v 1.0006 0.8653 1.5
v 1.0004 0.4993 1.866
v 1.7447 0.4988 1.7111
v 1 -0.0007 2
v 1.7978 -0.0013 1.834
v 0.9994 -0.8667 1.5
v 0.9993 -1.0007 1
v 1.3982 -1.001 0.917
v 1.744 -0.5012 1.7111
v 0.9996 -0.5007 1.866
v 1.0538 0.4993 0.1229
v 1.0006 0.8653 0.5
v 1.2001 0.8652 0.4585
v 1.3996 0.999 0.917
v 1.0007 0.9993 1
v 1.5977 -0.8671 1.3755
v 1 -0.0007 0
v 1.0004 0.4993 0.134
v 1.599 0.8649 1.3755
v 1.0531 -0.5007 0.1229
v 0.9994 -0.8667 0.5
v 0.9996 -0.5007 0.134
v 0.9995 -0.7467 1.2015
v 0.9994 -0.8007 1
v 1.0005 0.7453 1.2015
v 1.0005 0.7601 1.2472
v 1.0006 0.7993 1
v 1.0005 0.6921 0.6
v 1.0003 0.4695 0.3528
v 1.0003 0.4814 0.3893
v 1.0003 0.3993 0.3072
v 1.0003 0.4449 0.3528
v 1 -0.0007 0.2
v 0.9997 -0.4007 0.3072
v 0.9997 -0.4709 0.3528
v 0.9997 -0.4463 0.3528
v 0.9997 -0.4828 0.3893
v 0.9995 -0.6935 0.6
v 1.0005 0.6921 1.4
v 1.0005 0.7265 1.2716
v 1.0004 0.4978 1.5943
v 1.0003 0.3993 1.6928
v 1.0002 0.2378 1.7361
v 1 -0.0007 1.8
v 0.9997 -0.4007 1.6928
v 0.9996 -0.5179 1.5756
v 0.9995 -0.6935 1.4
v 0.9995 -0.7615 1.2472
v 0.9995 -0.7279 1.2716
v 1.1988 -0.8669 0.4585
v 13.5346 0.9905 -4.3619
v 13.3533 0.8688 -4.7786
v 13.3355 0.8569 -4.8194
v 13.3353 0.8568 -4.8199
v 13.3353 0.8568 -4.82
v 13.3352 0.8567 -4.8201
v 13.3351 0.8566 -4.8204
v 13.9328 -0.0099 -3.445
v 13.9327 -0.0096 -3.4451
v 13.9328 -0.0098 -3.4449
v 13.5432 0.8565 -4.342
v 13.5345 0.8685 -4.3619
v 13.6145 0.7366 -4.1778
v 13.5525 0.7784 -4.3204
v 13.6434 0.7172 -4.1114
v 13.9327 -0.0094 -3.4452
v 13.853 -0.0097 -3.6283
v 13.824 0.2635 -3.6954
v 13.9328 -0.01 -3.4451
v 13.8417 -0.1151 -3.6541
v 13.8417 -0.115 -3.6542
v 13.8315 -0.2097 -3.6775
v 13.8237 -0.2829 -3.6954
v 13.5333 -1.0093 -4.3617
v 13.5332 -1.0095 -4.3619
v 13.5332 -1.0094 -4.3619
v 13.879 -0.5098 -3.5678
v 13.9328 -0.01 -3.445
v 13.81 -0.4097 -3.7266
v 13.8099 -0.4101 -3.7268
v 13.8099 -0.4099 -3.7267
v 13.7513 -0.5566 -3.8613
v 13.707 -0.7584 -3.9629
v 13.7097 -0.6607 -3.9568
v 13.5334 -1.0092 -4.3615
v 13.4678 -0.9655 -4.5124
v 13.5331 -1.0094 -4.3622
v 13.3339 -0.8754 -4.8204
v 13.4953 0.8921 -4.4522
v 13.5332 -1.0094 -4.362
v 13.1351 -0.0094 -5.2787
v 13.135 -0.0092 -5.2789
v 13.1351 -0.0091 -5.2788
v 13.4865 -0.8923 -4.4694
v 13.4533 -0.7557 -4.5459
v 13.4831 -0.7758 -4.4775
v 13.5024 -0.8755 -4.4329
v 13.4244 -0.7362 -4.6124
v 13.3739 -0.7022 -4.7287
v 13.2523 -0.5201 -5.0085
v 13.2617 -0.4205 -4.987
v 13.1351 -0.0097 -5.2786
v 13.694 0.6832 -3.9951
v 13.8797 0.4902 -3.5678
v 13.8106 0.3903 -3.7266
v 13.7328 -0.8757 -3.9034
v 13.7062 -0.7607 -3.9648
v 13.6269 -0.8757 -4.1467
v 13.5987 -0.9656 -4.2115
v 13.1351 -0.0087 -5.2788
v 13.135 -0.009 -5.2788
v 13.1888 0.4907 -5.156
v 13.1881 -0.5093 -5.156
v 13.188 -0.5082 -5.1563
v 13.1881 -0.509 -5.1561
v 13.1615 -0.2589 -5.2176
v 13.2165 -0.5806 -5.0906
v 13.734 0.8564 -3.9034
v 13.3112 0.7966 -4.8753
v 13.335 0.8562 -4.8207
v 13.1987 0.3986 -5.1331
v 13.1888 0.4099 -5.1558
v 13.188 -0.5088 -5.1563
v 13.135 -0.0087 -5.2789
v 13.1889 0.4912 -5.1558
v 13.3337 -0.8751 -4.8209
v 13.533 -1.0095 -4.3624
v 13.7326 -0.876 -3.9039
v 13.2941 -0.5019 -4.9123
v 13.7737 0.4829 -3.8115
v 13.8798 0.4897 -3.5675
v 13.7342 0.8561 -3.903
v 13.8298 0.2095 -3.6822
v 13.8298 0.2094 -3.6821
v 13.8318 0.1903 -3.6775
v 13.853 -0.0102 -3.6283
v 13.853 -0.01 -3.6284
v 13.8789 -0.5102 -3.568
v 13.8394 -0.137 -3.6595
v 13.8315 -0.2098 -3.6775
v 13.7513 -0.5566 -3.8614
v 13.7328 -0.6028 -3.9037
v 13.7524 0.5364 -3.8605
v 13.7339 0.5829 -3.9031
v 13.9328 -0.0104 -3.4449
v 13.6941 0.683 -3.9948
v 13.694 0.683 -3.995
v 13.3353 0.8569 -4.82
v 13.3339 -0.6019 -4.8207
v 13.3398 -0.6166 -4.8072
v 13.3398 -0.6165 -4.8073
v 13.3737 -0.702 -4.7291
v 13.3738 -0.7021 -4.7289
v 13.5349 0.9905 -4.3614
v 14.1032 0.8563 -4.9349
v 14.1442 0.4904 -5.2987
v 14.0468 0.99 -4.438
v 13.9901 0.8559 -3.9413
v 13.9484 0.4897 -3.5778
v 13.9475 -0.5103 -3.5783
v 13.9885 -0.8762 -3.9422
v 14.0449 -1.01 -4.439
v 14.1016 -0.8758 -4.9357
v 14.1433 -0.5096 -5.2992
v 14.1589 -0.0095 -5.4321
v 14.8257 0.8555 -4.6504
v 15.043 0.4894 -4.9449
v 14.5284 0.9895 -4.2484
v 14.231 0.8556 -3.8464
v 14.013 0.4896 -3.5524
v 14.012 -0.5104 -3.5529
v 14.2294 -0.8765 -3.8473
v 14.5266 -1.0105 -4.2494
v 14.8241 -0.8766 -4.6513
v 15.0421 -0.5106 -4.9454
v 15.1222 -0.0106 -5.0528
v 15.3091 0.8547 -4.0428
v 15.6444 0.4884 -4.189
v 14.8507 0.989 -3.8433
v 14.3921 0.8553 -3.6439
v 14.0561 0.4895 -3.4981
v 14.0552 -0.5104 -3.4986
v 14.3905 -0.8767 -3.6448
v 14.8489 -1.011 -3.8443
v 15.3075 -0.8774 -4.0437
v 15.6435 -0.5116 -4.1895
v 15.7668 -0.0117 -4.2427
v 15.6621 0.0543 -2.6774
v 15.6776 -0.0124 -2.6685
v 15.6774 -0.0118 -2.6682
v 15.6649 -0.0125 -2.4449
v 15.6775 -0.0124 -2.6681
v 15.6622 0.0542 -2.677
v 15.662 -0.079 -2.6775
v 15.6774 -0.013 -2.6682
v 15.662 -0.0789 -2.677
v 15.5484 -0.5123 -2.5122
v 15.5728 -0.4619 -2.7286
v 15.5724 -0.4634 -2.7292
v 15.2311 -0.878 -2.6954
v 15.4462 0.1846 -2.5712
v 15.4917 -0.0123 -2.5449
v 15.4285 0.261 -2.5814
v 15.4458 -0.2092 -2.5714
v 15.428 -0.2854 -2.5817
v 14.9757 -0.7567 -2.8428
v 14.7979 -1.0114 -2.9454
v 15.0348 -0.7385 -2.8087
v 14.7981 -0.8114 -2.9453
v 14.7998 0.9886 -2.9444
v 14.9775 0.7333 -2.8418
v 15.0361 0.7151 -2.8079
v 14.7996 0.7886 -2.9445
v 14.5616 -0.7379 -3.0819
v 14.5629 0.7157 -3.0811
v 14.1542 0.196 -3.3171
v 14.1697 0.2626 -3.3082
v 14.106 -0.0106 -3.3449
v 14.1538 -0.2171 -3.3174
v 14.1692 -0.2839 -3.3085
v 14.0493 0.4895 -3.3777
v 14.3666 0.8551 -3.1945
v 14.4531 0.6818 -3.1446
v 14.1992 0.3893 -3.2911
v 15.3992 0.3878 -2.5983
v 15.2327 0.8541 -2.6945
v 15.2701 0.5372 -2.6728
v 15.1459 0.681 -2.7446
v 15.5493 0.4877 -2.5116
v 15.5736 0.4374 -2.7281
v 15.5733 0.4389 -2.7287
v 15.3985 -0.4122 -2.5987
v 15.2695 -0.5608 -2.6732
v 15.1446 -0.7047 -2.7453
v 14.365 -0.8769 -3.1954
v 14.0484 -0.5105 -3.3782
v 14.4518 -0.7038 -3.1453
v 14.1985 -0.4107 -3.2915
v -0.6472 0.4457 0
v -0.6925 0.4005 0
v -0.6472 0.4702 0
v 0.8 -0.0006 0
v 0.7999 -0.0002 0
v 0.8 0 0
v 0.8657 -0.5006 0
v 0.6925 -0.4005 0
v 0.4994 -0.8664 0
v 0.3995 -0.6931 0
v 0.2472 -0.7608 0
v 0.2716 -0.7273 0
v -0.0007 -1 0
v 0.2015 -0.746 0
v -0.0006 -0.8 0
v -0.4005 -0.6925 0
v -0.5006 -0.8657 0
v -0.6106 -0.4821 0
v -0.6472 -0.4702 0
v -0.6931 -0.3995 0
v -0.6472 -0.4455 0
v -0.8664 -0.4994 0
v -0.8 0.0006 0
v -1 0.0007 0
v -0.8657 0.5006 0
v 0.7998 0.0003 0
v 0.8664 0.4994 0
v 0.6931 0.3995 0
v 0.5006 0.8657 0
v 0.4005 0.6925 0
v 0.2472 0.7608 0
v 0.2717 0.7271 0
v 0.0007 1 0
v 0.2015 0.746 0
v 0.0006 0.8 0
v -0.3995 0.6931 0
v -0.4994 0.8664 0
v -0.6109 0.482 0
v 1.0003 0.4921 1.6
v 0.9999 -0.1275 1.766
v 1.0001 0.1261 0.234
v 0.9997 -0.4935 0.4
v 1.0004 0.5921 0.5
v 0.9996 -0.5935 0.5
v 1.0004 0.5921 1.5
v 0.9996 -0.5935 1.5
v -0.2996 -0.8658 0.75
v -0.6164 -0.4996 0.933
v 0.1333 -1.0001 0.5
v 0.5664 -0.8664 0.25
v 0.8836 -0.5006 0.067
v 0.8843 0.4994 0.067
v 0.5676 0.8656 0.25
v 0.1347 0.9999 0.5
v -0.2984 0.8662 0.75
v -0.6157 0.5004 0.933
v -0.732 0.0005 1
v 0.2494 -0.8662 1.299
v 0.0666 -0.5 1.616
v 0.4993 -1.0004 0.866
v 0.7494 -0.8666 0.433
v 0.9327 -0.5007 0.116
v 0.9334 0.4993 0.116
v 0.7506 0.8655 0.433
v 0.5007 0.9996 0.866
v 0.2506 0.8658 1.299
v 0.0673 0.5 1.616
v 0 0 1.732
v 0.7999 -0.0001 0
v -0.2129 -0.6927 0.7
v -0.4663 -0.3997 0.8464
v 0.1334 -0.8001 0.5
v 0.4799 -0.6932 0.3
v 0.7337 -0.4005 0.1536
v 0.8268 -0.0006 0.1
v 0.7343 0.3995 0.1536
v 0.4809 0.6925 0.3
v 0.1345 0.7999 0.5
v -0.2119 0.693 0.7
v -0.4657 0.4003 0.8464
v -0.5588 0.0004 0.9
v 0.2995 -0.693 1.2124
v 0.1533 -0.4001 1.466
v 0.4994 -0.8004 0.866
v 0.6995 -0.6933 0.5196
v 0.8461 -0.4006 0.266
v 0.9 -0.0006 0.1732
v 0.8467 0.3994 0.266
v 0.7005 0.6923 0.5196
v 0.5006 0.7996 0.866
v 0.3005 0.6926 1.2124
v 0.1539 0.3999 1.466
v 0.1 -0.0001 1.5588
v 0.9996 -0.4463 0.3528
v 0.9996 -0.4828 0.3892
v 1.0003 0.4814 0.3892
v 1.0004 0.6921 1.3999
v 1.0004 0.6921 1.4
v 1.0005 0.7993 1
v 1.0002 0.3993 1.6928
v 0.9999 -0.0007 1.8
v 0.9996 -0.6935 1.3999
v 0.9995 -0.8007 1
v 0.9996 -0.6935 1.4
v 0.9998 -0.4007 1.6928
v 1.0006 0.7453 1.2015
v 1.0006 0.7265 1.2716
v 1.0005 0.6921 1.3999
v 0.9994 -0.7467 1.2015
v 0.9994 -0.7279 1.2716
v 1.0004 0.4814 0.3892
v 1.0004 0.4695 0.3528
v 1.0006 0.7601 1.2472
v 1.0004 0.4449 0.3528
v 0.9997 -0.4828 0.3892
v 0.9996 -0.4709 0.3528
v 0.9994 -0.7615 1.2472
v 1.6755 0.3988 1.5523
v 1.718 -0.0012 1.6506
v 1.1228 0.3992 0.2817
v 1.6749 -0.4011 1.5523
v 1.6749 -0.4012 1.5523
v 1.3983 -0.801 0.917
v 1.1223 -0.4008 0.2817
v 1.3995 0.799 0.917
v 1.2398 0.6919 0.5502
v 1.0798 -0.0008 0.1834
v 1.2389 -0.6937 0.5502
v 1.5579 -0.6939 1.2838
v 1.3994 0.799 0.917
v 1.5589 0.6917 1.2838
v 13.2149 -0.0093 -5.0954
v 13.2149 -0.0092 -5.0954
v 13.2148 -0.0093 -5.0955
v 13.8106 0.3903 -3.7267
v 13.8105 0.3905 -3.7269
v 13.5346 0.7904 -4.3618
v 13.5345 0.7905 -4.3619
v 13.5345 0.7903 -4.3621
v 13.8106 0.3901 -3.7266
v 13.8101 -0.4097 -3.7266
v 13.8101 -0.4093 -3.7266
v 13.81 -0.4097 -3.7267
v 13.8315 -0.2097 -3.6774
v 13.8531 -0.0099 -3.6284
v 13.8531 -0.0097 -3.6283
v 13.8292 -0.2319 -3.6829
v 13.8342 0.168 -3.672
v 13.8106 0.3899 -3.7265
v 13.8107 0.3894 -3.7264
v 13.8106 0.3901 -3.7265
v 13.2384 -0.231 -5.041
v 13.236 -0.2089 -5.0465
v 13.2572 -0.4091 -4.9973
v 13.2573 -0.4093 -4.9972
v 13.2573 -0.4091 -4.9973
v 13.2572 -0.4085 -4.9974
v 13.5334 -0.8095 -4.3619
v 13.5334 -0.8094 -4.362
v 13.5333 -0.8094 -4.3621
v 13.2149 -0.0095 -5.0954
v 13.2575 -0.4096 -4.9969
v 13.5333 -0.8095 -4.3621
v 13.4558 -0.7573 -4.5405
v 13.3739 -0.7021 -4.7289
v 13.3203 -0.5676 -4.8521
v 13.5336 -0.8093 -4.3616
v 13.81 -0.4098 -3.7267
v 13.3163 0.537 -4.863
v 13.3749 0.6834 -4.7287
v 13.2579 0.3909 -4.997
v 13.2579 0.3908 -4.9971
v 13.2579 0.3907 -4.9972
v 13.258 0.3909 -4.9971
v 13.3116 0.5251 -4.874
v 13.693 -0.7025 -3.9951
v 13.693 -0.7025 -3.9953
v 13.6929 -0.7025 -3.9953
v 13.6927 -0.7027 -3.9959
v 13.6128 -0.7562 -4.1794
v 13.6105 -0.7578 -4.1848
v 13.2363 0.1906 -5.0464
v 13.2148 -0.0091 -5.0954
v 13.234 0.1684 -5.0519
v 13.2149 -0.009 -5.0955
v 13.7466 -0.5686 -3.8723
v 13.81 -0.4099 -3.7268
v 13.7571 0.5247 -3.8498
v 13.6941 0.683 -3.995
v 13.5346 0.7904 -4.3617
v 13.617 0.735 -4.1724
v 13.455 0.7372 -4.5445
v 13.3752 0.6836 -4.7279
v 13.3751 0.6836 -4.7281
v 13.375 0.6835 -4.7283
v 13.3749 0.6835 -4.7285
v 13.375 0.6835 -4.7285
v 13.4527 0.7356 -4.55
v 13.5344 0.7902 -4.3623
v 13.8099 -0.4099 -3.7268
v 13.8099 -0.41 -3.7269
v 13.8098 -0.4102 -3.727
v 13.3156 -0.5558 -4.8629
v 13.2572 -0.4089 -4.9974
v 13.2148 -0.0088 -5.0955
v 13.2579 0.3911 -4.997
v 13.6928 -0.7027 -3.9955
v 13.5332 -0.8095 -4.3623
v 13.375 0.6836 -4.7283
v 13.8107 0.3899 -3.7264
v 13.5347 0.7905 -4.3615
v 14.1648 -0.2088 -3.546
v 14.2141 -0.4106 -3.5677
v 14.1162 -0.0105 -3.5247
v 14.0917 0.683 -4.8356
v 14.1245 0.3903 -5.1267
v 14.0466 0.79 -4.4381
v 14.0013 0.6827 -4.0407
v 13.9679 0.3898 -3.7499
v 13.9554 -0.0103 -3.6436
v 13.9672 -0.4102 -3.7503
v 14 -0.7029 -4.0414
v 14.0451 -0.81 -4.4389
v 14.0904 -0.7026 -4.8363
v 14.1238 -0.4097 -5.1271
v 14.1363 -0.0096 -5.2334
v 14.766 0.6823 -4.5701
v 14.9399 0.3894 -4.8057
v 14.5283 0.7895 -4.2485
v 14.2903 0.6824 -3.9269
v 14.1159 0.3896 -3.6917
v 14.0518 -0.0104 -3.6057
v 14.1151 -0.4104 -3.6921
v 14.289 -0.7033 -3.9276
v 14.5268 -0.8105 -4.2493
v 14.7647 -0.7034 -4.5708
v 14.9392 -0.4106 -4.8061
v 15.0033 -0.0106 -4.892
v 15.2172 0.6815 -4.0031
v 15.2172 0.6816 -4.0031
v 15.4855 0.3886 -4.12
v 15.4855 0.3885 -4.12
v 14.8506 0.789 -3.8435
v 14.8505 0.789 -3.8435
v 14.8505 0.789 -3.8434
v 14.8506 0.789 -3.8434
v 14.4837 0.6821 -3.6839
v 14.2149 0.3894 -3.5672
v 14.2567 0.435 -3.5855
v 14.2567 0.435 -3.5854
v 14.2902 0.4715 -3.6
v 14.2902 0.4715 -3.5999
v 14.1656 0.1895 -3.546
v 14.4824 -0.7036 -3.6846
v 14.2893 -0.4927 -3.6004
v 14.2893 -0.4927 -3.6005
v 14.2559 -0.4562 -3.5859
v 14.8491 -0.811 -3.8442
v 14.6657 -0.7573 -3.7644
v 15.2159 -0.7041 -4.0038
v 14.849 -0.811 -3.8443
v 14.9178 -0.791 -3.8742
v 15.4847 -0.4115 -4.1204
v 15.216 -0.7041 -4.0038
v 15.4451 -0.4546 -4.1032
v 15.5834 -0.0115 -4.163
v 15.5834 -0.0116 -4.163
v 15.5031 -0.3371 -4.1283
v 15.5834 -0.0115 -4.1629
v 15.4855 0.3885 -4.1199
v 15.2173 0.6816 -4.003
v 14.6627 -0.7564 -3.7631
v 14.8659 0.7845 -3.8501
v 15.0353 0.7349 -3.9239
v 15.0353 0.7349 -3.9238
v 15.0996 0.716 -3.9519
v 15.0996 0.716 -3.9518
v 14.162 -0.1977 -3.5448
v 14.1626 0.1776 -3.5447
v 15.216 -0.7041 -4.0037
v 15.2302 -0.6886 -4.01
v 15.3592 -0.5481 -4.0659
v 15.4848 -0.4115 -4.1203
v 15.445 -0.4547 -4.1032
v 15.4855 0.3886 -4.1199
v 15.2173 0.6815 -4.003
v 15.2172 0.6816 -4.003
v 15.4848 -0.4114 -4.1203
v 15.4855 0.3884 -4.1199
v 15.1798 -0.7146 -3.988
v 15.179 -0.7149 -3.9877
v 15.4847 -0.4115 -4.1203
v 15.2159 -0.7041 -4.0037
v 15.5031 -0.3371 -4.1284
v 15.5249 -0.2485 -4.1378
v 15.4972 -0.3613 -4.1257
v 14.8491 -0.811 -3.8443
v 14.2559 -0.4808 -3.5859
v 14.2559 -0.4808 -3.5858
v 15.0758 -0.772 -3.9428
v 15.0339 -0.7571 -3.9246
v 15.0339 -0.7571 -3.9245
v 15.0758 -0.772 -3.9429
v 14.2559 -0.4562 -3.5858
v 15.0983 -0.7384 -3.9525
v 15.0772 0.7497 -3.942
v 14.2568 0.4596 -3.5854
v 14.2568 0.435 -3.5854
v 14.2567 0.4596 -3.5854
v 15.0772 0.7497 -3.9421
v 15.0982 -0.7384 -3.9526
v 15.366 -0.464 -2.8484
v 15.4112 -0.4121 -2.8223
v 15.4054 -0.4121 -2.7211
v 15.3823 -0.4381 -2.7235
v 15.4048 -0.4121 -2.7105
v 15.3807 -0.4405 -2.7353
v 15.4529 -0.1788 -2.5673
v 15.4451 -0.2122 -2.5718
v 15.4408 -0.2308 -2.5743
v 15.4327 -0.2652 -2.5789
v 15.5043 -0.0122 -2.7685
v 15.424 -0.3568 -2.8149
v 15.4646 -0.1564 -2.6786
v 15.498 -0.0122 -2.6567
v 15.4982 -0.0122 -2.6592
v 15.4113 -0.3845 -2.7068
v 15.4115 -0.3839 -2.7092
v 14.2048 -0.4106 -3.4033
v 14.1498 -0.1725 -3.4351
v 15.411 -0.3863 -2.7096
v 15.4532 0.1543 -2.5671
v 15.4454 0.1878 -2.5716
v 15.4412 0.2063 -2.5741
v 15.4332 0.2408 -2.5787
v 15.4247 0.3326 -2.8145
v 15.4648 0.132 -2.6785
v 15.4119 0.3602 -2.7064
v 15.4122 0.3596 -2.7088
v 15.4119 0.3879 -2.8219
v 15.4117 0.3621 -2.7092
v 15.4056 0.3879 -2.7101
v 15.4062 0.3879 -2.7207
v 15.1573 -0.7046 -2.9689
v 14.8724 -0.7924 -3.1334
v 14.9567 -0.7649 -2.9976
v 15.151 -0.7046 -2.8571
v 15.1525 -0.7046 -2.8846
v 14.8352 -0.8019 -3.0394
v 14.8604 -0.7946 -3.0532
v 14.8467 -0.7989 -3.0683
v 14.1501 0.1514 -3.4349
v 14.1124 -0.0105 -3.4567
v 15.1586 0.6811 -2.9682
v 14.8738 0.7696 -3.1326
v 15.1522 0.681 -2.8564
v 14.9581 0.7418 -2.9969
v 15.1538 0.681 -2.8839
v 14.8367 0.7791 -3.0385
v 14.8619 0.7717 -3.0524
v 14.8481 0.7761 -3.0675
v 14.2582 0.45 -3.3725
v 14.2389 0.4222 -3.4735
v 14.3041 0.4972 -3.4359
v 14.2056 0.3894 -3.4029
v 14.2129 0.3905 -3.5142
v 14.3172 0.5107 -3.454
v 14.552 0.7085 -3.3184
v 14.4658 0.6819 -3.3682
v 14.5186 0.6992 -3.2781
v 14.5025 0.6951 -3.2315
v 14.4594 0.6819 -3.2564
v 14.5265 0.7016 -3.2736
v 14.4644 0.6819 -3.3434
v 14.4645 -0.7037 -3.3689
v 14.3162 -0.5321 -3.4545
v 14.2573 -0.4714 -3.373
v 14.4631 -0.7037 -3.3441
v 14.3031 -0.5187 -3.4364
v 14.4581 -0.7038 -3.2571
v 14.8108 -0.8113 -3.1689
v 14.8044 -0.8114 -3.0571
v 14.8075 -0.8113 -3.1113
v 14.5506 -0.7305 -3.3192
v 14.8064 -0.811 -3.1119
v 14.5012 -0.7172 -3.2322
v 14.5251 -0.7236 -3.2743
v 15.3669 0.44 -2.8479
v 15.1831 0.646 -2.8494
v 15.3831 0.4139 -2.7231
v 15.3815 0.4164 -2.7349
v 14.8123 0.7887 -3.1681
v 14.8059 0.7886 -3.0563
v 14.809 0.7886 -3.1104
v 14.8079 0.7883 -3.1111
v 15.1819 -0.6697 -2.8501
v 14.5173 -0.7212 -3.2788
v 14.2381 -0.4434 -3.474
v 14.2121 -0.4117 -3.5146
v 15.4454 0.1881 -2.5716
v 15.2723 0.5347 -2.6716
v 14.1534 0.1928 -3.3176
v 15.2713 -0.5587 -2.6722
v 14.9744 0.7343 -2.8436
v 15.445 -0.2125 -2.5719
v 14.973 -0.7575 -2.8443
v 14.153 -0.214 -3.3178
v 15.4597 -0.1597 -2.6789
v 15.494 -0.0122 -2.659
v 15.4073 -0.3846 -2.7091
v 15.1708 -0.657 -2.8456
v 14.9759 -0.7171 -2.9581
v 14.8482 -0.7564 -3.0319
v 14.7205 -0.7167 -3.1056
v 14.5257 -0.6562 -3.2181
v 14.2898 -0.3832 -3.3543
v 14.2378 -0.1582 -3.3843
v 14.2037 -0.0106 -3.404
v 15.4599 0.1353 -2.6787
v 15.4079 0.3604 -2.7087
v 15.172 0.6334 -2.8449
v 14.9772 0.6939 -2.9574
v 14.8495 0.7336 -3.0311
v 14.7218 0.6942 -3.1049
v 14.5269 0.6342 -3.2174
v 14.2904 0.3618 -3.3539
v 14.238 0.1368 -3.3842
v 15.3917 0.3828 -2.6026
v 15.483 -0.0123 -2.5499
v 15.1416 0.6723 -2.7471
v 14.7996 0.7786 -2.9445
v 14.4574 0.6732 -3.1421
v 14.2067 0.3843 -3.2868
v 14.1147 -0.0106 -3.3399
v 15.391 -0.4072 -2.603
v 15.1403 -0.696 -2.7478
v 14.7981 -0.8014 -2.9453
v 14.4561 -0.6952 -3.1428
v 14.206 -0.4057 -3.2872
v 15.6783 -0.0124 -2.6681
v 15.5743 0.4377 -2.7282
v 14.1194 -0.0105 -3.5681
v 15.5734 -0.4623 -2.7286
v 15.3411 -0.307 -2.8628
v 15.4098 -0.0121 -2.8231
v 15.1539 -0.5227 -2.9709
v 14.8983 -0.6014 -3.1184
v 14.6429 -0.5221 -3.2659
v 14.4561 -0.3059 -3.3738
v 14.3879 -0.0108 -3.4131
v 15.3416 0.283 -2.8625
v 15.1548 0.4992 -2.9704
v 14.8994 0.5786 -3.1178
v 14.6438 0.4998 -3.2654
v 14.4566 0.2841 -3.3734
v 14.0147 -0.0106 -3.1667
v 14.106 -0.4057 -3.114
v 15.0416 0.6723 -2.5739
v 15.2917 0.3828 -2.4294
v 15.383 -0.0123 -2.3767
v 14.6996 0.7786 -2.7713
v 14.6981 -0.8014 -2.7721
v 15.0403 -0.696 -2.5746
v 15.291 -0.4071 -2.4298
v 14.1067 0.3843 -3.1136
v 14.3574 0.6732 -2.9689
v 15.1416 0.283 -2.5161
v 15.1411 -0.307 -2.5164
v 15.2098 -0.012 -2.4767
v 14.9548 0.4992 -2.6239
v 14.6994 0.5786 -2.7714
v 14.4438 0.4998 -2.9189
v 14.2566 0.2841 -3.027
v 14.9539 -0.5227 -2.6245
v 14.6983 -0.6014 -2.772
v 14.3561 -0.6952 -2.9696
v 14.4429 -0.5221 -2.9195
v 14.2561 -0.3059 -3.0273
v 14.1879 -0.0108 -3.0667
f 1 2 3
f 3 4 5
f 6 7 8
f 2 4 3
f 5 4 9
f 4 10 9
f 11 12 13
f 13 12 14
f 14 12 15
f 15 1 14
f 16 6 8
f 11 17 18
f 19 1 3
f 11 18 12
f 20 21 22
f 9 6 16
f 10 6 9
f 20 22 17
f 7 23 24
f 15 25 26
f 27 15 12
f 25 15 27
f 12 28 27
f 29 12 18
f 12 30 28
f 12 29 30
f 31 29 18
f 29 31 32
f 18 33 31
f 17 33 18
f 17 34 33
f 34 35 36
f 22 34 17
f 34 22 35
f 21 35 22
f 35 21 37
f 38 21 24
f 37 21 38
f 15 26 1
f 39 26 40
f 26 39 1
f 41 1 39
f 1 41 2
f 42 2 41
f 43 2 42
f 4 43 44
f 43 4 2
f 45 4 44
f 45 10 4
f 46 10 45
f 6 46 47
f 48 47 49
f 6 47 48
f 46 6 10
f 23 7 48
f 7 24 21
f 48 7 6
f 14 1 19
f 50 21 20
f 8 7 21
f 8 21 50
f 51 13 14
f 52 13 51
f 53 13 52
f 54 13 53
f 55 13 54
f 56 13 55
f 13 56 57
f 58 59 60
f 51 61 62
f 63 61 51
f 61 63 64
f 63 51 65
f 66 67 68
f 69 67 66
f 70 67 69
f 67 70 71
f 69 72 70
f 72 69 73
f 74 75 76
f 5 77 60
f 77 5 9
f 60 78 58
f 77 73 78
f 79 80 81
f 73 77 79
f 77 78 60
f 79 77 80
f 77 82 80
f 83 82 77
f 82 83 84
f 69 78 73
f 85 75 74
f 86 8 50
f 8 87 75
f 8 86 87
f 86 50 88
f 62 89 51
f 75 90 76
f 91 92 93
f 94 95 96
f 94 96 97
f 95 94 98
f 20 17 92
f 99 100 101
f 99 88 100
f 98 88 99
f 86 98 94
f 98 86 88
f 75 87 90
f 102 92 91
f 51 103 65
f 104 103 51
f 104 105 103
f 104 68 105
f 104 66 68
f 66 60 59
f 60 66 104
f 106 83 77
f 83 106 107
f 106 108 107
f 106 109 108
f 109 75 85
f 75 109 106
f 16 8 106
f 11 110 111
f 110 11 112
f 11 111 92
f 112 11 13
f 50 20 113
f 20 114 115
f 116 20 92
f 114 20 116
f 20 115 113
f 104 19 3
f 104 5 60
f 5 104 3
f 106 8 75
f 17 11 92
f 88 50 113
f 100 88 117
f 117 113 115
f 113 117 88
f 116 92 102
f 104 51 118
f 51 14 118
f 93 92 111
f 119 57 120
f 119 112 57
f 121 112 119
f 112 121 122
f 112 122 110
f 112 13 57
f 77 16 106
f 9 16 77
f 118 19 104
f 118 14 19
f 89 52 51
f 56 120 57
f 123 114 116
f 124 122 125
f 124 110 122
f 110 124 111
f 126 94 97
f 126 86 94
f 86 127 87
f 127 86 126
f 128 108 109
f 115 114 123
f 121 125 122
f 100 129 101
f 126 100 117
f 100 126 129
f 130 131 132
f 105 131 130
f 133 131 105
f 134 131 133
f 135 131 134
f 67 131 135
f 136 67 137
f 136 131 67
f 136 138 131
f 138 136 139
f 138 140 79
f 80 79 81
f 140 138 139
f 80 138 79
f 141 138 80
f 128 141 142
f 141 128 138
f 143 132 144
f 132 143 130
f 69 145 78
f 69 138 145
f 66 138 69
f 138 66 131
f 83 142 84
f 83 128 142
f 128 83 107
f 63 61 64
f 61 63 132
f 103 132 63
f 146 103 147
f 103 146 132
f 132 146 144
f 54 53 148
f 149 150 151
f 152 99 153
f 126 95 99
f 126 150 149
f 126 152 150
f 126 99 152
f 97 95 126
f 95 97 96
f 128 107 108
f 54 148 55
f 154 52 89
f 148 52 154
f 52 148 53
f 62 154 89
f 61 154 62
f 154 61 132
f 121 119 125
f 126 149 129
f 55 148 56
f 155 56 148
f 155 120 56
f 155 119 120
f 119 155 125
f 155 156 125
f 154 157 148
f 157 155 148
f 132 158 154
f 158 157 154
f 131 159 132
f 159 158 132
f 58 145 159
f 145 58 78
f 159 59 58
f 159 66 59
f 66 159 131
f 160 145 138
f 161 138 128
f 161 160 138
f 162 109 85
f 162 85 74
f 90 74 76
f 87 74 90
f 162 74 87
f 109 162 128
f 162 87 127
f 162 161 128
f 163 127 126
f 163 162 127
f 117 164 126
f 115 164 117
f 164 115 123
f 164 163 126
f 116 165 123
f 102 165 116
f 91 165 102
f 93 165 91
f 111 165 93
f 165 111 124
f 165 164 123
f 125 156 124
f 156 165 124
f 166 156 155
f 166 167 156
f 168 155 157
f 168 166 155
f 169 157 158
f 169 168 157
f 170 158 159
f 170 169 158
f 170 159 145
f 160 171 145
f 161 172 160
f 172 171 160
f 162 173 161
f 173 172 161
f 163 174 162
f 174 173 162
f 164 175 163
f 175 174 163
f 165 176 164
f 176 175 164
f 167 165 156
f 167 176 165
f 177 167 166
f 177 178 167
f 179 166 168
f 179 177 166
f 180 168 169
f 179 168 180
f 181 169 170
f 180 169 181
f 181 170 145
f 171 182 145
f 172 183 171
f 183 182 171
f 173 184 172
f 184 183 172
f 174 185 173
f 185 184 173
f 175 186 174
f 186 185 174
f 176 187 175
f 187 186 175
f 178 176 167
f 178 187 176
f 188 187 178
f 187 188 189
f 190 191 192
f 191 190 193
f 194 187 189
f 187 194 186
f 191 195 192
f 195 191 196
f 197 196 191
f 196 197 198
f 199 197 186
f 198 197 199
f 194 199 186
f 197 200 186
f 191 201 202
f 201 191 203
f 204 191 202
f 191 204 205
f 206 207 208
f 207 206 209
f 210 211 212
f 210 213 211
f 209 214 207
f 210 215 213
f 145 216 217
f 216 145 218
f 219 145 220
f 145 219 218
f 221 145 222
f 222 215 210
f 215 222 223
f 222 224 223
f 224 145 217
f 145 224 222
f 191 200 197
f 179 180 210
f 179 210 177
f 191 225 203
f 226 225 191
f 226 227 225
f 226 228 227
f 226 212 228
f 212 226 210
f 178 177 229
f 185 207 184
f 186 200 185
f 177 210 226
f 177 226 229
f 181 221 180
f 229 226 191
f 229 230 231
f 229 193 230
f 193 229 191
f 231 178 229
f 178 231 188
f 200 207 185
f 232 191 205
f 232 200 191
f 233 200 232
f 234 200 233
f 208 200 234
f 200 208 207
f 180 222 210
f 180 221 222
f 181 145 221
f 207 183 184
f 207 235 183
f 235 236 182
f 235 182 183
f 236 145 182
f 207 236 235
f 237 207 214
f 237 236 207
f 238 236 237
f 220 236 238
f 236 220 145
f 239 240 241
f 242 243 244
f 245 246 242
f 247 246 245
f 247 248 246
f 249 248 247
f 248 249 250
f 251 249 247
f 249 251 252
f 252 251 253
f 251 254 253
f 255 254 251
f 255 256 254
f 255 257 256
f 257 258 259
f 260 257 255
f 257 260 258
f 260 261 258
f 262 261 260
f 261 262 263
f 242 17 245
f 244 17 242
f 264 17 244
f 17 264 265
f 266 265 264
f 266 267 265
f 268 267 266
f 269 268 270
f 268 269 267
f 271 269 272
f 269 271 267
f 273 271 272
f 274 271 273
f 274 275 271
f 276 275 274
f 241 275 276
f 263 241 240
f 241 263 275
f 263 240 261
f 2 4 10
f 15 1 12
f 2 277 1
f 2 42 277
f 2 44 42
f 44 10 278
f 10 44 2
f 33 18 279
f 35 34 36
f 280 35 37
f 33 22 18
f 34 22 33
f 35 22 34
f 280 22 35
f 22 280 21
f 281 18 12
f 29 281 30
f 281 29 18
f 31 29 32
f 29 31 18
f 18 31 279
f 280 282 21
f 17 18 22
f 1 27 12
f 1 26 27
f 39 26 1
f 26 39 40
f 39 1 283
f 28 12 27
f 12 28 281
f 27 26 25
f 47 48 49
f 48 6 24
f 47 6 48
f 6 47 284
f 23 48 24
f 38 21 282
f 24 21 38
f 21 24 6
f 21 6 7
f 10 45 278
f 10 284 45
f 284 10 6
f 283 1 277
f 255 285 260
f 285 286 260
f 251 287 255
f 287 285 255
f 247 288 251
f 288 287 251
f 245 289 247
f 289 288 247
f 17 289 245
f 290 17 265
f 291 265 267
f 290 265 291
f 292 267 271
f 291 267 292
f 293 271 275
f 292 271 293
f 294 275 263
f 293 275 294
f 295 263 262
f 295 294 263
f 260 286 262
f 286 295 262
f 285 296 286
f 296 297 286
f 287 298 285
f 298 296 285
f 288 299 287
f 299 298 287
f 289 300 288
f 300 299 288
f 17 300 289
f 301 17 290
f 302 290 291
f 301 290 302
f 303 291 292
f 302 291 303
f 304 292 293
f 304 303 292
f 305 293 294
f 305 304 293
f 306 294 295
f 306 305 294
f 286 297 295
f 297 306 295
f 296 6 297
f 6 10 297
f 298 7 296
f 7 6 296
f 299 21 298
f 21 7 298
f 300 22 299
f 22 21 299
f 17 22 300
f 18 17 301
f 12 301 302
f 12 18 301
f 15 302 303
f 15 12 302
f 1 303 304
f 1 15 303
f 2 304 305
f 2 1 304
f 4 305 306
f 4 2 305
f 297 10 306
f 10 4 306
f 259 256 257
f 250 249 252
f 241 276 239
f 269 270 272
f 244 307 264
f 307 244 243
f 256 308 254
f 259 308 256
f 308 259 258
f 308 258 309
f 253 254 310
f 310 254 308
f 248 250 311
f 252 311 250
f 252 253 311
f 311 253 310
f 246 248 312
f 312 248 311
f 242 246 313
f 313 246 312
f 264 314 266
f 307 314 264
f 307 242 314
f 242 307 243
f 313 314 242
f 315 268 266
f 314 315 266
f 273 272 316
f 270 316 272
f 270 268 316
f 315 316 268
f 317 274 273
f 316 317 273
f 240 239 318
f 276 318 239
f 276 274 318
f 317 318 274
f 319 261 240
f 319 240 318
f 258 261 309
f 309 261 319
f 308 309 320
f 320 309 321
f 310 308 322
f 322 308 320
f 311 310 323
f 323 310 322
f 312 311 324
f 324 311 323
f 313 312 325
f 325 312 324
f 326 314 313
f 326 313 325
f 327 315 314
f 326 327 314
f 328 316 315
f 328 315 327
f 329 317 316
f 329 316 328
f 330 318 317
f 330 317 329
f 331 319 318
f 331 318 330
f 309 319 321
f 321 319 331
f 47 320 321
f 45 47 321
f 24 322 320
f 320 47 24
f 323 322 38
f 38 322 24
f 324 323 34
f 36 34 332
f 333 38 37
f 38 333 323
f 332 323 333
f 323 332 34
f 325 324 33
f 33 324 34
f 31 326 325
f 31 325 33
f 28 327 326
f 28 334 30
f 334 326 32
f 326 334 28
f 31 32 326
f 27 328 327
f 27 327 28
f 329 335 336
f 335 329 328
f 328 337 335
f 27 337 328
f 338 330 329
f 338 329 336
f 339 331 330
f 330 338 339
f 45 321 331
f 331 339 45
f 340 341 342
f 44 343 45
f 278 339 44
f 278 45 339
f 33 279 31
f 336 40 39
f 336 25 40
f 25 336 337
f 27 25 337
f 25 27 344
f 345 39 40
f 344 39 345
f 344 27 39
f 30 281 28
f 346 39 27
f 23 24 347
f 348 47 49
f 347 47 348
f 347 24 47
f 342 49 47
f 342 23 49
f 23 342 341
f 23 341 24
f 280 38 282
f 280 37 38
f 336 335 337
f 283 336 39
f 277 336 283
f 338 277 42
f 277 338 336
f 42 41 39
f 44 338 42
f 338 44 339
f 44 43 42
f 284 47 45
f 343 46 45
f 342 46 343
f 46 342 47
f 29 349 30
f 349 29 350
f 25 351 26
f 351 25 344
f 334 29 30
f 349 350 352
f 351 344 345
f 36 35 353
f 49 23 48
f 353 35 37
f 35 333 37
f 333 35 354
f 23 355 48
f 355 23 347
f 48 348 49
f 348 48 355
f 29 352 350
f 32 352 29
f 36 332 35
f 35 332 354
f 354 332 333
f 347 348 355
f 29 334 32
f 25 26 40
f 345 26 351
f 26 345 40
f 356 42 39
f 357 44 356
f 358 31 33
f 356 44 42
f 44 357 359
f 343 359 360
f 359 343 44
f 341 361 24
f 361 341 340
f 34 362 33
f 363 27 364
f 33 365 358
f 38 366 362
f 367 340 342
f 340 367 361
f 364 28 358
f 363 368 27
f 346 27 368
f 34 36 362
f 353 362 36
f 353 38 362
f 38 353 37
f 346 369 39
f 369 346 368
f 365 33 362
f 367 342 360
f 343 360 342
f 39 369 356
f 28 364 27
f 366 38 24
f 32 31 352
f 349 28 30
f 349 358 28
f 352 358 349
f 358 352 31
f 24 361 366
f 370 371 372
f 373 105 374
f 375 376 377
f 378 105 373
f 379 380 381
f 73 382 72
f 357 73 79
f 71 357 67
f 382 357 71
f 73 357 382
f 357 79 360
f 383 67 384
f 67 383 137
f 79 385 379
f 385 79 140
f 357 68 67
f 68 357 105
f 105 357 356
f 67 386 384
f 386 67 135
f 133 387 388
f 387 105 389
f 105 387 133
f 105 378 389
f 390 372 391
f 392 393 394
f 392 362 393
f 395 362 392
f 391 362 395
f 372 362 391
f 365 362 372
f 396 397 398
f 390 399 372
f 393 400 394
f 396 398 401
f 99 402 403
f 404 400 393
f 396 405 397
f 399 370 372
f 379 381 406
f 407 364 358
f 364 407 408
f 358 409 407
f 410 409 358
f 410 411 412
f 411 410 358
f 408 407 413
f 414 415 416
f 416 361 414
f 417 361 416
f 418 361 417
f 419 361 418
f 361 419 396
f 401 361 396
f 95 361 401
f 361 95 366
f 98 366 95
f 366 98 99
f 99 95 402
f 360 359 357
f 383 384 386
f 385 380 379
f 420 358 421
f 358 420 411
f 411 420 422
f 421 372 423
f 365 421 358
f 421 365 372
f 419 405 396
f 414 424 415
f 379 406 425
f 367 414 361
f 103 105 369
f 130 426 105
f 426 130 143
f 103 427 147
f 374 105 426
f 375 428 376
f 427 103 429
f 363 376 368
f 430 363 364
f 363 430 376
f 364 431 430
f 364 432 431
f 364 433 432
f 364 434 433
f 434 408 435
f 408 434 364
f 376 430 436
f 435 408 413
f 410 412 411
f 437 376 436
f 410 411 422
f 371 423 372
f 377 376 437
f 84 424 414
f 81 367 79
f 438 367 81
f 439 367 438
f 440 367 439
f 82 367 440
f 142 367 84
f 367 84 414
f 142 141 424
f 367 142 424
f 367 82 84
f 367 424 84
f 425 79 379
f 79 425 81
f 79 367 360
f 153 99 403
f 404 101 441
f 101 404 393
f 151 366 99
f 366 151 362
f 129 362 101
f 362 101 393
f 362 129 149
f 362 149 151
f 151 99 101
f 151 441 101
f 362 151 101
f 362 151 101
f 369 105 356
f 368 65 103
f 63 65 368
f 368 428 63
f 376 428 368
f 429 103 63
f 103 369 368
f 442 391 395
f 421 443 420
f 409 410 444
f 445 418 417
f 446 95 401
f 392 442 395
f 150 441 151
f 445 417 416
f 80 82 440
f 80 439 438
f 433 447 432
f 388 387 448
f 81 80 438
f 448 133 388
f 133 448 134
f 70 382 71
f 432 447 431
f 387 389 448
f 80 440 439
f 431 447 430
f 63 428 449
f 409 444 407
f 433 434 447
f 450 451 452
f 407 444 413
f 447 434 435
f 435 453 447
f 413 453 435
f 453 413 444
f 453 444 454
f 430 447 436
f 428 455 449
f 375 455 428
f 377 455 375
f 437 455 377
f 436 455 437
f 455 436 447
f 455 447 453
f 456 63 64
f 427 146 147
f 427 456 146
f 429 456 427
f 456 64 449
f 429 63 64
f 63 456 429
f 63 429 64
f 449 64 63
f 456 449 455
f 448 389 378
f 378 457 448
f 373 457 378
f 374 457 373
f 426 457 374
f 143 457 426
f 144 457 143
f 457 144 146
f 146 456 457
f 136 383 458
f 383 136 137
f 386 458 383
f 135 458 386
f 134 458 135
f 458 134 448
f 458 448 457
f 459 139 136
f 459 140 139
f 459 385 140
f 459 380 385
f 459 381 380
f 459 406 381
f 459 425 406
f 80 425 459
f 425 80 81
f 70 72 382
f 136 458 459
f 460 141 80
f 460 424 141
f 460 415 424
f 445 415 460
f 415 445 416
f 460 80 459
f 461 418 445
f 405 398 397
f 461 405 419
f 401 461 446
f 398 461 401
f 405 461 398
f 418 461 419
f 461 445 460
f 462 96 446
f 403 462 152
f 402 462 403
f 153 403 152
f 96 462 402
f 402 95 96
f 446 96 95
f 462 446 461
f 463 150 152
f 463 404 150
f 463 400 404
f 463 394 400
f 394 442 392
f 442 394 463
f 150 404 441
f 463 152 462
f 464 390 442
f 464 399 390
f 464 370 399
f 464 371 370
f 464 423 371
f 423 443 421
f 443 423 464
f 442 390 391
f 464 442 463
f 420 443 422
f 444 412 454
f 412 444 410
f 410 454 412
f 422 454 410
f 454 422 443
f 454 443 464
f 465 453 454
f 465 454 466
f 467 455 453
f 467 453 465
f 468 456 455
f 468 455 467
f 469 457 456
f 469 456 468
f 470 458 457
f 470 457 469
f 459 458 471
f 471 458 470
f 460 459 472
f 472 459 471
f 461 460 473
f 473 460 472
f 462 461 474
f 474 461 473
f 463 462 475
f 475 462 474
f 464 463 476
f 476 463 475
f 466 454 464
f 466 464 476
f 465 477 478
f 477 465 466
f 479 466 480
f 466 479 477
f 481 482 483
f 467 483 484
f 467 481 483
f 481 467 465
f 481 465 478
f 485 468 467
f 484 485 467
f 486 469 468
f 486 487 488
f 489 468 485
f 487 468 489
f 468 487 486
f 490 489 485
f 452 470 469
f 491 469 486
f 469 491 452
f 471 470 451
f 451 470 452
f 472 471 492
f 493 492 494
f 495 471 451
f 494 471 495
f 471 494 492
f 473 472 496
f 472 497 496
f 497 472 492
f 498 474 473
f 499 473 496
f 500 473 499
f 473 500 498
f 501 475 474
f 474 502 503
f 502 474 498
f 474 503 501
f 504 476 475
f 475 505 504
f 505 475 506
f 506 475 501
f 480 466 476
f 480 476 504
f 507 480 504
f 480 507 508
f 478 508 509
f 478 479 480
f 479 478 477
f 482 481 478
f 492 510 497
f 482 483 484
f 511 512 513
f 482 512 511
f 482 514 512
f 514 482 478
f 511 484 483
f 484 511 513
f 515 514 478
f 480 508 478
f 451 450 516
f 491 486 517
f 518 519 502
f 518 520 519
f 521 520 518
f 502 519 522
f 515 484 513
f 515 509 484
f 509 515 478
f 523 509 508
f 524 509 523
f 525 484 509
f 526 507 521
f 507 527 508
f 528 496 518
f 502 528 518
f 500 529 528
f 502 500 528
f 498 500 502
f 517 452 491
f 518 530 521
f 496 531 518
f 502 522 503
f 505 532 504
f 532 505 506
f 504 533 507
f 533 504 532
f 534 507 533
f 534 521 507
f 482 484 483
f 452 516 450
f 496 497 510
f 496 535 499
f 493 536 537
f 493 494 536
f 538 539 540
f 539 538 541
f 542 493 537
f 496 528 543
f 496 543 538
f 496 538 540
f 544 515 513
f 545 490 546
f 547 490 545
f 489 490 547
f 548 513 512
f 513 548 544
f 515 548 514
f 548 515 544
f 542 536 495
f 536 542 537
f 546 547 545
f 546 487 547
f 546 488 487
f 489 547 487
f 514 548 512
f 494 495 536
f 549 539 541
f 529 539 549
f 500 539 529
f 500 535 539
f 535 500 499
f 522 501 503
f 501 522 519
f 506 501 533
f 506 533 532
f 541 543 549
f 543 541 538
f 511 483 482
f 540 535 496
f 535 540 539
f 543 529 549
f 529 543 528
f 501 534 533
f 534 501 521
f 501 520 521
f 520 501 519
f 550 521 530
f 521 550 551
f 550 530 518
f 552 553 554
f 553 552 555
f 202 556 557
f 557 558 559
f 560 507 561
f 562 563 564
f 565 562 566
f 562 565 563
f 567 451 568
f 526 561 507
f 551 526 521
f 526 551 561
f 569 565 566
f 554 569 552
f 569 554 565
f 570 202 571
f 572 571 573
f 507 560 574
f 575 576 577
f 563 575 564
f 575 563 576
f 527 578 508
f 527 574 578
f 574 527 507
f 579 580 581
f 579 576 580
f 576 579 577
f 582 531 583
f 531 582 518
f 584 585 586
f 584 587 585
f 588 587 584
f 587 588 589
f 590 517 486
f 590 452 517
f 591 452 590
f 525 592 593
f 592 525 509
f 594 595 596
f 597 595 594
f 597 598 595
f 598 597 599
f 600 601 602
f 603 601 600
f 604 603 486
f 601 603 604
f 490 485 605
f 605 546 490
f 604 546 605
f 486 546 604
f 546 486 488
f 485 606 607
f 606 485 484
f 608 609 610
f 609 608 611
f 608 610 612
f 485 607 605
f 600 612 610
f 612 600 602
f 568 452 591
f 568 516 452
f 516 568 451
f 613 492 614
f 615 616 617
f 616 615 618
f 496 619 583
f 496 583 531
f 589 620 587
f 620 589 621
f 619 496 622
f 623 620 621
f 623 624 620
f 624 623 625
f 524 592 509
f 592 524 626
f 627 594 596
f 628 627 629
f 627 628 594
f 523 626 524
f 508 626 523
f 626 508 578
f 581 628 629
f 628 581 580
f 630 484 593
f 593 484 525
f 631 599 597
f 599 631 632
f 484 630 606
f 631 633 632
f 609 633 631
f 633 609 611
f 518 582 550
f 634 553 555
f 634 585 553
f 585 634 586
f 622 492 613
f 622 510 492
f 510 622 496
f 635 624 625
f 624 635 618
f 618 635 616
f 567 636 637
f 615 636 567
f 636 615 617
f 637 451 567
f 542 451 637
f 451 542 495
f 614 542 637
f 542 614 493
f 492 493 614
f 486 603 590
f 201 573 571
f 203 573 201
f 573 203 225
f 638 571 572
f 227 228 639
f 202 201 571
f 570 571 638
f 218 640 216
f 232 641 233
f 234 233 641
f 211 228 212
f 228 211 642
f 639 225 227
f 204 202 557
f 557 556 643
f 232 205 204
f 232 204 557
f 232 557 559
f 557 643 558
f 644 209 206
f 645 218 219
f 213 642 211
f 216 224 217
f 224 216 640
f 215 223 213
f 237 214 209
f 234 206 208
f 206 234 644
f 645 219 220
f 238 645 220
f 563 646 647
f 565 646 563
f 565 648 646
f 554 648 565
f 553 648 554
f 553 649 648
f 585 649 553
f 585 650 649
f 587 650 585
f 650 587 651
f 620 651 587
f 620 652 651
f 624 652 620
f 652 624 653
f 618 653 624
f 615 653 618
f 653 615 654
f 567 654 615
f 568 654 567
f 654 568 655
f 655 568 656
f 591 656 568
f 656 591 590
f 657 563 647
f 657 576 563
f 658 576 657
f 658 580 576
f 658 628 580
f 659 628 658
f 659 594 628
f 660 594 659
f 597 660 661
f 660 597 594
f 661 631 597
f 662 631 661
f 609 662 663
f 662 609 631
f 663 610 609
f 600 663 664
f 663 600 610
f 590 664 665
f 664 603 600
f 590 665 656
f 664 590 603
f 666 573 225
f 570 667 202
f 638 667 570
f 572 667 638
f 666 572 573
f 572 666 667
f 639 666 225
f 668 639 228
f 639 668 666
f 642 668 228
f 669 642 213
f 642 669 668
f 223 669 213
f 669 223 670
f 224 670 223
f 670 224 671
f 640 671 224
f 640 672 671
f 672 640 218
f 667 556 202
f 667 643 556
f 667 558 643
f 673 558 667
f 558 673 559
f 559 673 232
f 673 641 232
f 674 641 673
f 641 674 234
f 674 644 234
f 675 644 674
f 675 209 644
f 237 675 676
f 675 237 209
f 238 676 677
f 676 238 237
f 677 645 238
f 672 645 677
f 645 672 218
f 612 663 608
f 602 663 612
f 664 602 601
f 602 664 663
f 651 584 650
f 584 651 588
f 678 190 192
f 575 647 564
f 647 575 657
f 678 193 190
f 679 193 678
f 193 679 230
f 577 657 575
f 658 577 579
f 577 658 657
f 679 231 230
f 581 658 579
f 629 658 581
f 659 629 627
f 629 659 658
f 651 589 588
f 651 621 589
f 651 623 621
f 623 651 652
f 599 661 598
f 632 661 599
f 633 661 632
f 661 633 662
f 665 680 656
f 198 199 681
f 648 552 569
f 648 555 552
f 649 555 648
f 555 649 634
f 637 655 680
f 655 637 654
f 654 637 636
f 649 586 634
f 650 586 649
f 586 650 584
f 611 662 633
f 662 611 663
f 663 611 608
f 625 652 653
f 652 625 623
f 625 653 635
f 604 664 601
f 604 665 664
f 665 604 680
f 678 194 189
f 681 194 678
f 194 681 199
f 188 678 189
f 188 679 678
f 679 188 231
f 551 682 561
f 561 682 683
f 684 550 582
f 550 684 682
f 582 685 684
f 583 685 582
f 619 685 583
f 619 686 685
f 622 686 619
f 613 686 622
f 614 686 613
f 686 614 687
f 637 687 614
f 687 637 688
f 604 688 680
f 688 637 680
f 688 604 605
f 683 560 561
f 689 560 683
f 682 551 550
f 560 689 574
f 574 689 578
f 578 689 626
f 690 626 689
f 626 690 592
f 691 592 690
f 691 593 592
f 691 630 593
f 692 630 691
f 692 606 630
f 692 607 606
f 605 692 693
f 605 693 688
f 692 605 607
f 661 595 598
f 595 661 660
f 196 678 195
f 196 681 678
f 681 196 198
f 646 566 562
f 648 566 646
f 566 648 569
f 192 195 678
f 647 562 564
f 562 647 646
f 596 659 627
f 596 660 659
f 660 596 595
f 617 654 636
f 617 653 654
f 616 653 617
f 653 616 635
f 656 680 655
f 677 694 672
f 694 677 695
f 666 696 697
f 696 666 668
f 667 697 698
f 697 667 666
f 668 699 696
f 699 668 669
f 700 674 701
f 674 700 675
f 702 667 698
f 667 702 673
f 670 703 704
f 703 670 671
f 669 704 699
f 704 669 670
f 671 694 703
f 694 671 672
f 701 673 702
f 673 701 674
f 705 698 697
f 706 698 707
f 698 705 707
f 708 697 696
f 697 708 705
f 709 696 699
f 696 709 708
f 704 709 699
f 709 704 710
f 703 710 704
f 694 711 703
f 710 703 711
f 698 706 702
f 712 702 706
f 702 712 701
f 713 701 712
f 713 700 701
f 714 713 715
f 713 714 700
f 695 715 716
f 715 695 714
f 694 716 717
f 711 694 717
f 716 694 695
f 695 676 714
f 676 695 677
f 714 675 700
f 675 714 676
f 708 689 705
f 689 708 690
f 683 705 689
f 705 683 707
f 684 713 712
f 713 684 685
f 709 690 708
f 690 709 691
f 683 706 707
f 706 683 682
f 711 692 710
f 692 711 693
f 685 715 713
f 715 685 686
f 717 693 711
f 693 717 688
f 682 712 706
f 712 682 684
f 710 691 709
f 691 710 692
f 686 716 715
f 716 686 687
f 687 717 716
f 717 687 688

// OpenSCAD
tolerance=0.01;
hole_radius=0.05;
grid_hole_radius=0.05;
outer_radius=1;
thickness=0.2;
hole_attach_height=0.05;
attach_thickness=0.1;

//parameters that don't have to be defined explicitly
eps = tolerance/100;
inner_radius = outer_radius - thickness;
fn = 12;
fnh = 6;

module angled_cylinder(angle_deg_y, _h, _r, angle_deg_x = 0) {
    rotate([angle_deg_x, angle_deg_y, 0]) { // Rotate the cylinder 
            cylinder(h = _h, r = _r, center = true, $fn = fnh);
        }
}

module hole(_h) {
    cylinder(h = _h, r = grid_hole_radius, $fn = fnh);
}

//makes circle of holes
module circular_grid(_h, _r, _n) {
    for (i = [0:_n-1]) {
        angle = i * 360 / _n;
        x_pos = _r * cos(angle);
        y_pos = _r * sin(angle);
        translate([x_pos, y_pos, -eps]) {
            hole(_h);
        }
    }
}

//makes grid of holes
module hole_grid(hole_height, grid_h) {
    translate([0,0,hole_height]) {
        difference() {
            //cylinder
            cylinder(h = grid_h, r = (inner_radius + outer_radius)/2, 
                center=false, $fn = fn);
            //holes
            for (i = [0 : grid_hole_radius * 2 + hole_attach_height : inner_radius - grid_hole_radius * 2]) {
                circular_grid(grid_h + eps*2, i, ceil(6.28*i/(grid_hole_radius*4)));
            }
            
        } 
    }
}

//makes curve of CSC
module curve(_radius, _twist, _turning_angle, _turning_radius) {
    rotate([90,0,_twist])
    translate([-_turning_radius, 0, 0])
    rotate_extrude(angle=_turning_angle, convexity=100, $fn = fn)
    translate([_turning_radius, 0]) circle(_radius);
}

module CSC(_r, _t1, _ta1, _tr1, _h, _t2, _ta2, _tr2, is_inner) {
    
    if (_ta1 > 90) {
        CSC(_r, _t1, 90, _tr1, 0, 0, 0, 0, is_inner);
        
        pos1 = (-_tr1 + sqrt(_tr1*_tr1 - pow(_tr1,2)));
        translate([pos1*cos(_t1),pos1*sin(_t1),_tr1])
        rotate([0,-90,_t1])
        CSC(_r, 0, _ta1 - 90, _tr1, _h, _t2, _ta2, _tr2, is_inner);
    } else if (_ta2 > 90) {
        CSC(_r, _t1, _ta1, _tr1, _h, _t2, 90, _tr2, is_inner);
        
        pos1 = (-_tr1 + sqrt(_tr1*_tr1 - pow(_tr1*sin(_ta1),2)));
        pos2 = (-_tr2 + sqrt(_tr2*_tr2 - pow(_tr2,2)));
        translate([pos1*cos(_t1),pos1*sin(_t1),_tr1*sin(_ta1)])
        rotate([0,-_ta1,_t1])
        translate([0, 0, _h])
        translate([pos2*cos(_t2),pos2*sin(_t2),_tr2])
        rotate([0,-90,_t2])
        CSC(_r, 0, 0, 0, 0, 0, _ta2 - 90, _tr2, is_inner);
    } else {
        //intermediate positions
        pos1 = (-_tr1 + sqrt(_tr1*_tr1 - pow(_tr1*sin(_ta1),2)));
        pos2 = (-_tr2 + sqrt(_tr2*_tr2 - pow(_tr2*sin(_ta2),2)));
        
        union() {
            //bottom shell threshold
            if (is_inner) {
                cylinder(h=eps, r=_r, center=true);
            }
            
            //first curve of CSC
            curve(_r, _t1, _ta1, _tr1);
            
            //straight link of CSC
            translate([pos1*cos(_t1),pos1*sin(_t1),_tr1*sin(_ta1)])
            rotate([0,-_ta1,_t1])
            if (is_inner) {
                //add threshold for shelling
                translate([0,0,-eps /2])
                cylinder(h=_h + eps,r=_r, center = false, $fn= fn);
            } else {
                cylinder(h=_h,r=_r, center = false, $fn= fn);
            }
            
            //second curve of CSC
            translate([pos1*cos(_t1),pos1*sin(_t1),_tr1*sin(_ta1)])
            rotate([0,-_ta1,_t1])
            translate([0, 0, _h])
            curve(_r, _t2, _ta2, _tr2);
            
            //shelling thresholds
            if (is_inner) {
                translate([pos1*cos(_t1),pos1*sin(_t1),_tr1*sin(_ta1)])
                rotate([0,-_ta1,_t1])
                translate([0, 0, _h])
                translate([pos2*cos(_t2),pos2*sin(_t2),_tr2*sin(_ta2)])
                rotate([0,-_ta2,_t2]) {
                    cylinder(h=eps, r=_r, center=true,$fn=fn);
                }
            
            }
        }
    }
    
}

//allow modules to attach
module CSC_ATTACH(_r, _t1, _ta1, _tr1, _h, _t2, _ta2, _tr2, next_hole_radius, next_hole_attach_height, next_inner) {
    
    if (_ta1 > 90) {        
        pos1 = (-_tr1 + sqrt(_tr1*_tr1 - pow(_tr1,2)));
        translate([pos1*cos(_t1),pos1*sin(_t1),_tr1])
        rotate([0,-90,_t1])
        CSC_ATTACH(_r, 0, _ta1 - 90, _tr1, _h, _t2, _ta2, _tr2, next_hole_radius, next_hole_attach_height, next_inner);
    } else if (_ta2 > 90) {        
        pos1 = (-_tr1 + sqrt(_tr1*_tr1 - pow(_tr1*sin(_ta1),2)));
        pos2 = (-_tr2 + sqrt(_tr2*_tr2 - pow(_tr2,2)));
        translate([pos1*cos(_t1),pos1*sin(_t1),_tr1*sin(_ta1)])
        rotate([0,-_ta1,_t1])
        translate([0, 0, _h])
        translate([pos2*cos(_t2),pos2*sin(_t2),_tr2])
        rotate([0,-90,_t2])
        CSC_ATTACH(_r, 0, 0, 0, 0, 0, _ta2 - 90, _tr2, next_hole_radius, next_hole_attach_height, next_inner);
    } else {
        //intermediate positions
        pos1 = (-_tr1 + sqrt(_tr1*_tr1 - pow(_tr1*sin(_ta1),2)));
        pos2 = (-_tr2 + sqrt(_tr2*_tr2 - pow(_tr2*sin(_ta2),2)));
        
        translate([pos1*cos(_t1),pos1*sin(_t1),_tr1*sin(_ta1)])
        rotate([0,-_ta1,_t1])
        translate([0, 0, _h])
        translate([pos2*cos(_t2),pos2*sin(_t2),_tr2*sin(_ta2)])
        rotate([0,-_ta2,_t2]) {
            difference() {
                union() {
                    //attachment for smaller cylinder
                    translate([0,0,-attach_thickness])
                    cylinder(h=attach_thickness, r=_r - thickness/2, $fn=fn);
                    translate([0,0,-attach_thickness*2])
                    cylinder(h=attach_thickness*2, r1=_r - thickness/2, r2=next_inner - tolerance - thickness, $fn=fn);
                    
                    //small cylinder
                    cylinder(h=next_hole_radius*2 + next_hole_attach_height * 2, r = next_inner - tolerance, $fn=fn);
                }
                
                //shelling
                translate([0,0, -attach_thickness*2 - eps/2])
                cylinder(h=next_hole_radius*2 + next_hole_attach_height * 2 + attach_thickness*2 + eps, r = min(inner_radius, next_inner - tolerance - thickness), $fn=fn);
                
                //holes for screws
    //            translate([0,0,next_hole_attach_height + next_hole_radius]) {
    //                angled_cylinder(0, (next_inner + thickness + eps) * 2,  hole_radius, 90);
    //                angled_cylinder(90, (next_inner + thickness + eps) * 2, hole_radius, 0);
    //            }
            }
        }
    }
}

//remove overlap to allow all branches to attach to each other
module CSC_REMOVE_OVERLAP(_r, _t1, _ta1, _tr1, _h, _t2, _ta2, _tr2, next_hole_radius, next_hole_attach_height, next_inner) {
    if (_ta1 > 90) {        
        pos1 = (-_tr1 + sqrt(_tr1*_tr1 - pow(_tr1,2)));
        translate([pos1*cos(_t1),pos1*sin(_t1),_tr1])
        rotate([0,-90,_t1])
        CSC_REMOVE_OVERLAP(_r, 0, _ta1 - 90, _tr1, _h, _t2, _ta2, _tr2, next_hole_radius, next_hole_attach_height, next_inner);
    } else if (_ta2 > 90) {        
        pos1 = (-_tr1 + sqrt(_tr1*_tr1 - pow(_tr1*sin(_ta1),2)));
        pos2 = (-_tr2 + sqrt(_tr2*_tr2 - pow(_tr2,2)));
        translate([pos1*cos(_t1),pos1*sin(_t1),_tr1*sin(_ta1)])
        rotate([0,-_ta1,_t1])
        translate([0, 0, _h])
        translate([pos2*cos(_t2),pos2*sin(_t2),_tr2])
        rotate([0,-90,_t2])
        CSC_REMOVE_OVERLAP(_r, 0, 0, 0, 0, 0, _ta2 - 90, _tr2, next_hole_radius, next_hole_attach_height, next_inner);
    } else {
        pos1 = (-_tr1 + sqrt(_tr1*_tr1 - pow(_tr1*sin(_ta1),2)));
        pos2 = (-_tr2 + sqrt(_tr2*_tr2 - pow(_tr2*sin(_ta2),2)));
        
        translate([pos1*cos(_t1),pos1*sin(_t1),_tr1*sin(_ta1)])
        rotate([0,-_ta1,_t1])
        translate([0, 0, _h])
        translate([pos2*cos(_t2),pos2*sin(_t2),_tr2*sin(_ta2)])
        rotate([0,-_ta2,_t2]) {
//            cylinder(h=999999, r=_r + tolerance, $fn=fn);
        }
    }
}

//c is _t1, _ta1, _tr1, _h, _t2, _ta2, _tr2, next hole radius, next hole height, next inner radius
module branch(branch_list, _outer, _inner) {
    union() {
        //make grid of holes
        //hole_grid(hole_radius*2 + hole_attach_height * 2, grid_hole_radius);
        
        //make CSC shells for each CSC in branch_list
        difference() {
            for (c = branch_list) {
                CSC(_outer,c[0],c[1],c[2],c[3],c[4],c[5],c[6], false);
            }
            
            for (c = branch_list) {
                CSC(_inner,c[0],c[1],c[2],c[3],c[4],c[5],c[6], true);
                CSC_REMOVE_OVERLAP(_outer,c[0],c[1],c[2],c[3],c[4],c[5],c[6],c[7], c[8], c[9]);
            }
            
            //make screw holes at the bottom
//            translate([0,0,hole_radius + hole_attach_height]) {
//                angled_cylinder(0, (outer_radius*1.5 + eps) * 2,  hole_radius, 90);
//                angled_cylinder(90, (outer_radius*1.5 + eps) * 2, hole_radius, 0);
//            }    
        }
        for (c=branch_list) {     
            CSC_ATTACH(_outer,c[0],c[1],c[2],c[3],c[4],c[5],c[6], c[7], c[8], c[9]);
        }
    }
}

branch([
[ 179.9597, 113.5097, 1.0*outer_radius, 13.2335*outer_radius, -179.9677, 143.5097, 1.0*outer_radius, 0.05, 0.05, 0.8],
],outer_radius,inner_radius);
